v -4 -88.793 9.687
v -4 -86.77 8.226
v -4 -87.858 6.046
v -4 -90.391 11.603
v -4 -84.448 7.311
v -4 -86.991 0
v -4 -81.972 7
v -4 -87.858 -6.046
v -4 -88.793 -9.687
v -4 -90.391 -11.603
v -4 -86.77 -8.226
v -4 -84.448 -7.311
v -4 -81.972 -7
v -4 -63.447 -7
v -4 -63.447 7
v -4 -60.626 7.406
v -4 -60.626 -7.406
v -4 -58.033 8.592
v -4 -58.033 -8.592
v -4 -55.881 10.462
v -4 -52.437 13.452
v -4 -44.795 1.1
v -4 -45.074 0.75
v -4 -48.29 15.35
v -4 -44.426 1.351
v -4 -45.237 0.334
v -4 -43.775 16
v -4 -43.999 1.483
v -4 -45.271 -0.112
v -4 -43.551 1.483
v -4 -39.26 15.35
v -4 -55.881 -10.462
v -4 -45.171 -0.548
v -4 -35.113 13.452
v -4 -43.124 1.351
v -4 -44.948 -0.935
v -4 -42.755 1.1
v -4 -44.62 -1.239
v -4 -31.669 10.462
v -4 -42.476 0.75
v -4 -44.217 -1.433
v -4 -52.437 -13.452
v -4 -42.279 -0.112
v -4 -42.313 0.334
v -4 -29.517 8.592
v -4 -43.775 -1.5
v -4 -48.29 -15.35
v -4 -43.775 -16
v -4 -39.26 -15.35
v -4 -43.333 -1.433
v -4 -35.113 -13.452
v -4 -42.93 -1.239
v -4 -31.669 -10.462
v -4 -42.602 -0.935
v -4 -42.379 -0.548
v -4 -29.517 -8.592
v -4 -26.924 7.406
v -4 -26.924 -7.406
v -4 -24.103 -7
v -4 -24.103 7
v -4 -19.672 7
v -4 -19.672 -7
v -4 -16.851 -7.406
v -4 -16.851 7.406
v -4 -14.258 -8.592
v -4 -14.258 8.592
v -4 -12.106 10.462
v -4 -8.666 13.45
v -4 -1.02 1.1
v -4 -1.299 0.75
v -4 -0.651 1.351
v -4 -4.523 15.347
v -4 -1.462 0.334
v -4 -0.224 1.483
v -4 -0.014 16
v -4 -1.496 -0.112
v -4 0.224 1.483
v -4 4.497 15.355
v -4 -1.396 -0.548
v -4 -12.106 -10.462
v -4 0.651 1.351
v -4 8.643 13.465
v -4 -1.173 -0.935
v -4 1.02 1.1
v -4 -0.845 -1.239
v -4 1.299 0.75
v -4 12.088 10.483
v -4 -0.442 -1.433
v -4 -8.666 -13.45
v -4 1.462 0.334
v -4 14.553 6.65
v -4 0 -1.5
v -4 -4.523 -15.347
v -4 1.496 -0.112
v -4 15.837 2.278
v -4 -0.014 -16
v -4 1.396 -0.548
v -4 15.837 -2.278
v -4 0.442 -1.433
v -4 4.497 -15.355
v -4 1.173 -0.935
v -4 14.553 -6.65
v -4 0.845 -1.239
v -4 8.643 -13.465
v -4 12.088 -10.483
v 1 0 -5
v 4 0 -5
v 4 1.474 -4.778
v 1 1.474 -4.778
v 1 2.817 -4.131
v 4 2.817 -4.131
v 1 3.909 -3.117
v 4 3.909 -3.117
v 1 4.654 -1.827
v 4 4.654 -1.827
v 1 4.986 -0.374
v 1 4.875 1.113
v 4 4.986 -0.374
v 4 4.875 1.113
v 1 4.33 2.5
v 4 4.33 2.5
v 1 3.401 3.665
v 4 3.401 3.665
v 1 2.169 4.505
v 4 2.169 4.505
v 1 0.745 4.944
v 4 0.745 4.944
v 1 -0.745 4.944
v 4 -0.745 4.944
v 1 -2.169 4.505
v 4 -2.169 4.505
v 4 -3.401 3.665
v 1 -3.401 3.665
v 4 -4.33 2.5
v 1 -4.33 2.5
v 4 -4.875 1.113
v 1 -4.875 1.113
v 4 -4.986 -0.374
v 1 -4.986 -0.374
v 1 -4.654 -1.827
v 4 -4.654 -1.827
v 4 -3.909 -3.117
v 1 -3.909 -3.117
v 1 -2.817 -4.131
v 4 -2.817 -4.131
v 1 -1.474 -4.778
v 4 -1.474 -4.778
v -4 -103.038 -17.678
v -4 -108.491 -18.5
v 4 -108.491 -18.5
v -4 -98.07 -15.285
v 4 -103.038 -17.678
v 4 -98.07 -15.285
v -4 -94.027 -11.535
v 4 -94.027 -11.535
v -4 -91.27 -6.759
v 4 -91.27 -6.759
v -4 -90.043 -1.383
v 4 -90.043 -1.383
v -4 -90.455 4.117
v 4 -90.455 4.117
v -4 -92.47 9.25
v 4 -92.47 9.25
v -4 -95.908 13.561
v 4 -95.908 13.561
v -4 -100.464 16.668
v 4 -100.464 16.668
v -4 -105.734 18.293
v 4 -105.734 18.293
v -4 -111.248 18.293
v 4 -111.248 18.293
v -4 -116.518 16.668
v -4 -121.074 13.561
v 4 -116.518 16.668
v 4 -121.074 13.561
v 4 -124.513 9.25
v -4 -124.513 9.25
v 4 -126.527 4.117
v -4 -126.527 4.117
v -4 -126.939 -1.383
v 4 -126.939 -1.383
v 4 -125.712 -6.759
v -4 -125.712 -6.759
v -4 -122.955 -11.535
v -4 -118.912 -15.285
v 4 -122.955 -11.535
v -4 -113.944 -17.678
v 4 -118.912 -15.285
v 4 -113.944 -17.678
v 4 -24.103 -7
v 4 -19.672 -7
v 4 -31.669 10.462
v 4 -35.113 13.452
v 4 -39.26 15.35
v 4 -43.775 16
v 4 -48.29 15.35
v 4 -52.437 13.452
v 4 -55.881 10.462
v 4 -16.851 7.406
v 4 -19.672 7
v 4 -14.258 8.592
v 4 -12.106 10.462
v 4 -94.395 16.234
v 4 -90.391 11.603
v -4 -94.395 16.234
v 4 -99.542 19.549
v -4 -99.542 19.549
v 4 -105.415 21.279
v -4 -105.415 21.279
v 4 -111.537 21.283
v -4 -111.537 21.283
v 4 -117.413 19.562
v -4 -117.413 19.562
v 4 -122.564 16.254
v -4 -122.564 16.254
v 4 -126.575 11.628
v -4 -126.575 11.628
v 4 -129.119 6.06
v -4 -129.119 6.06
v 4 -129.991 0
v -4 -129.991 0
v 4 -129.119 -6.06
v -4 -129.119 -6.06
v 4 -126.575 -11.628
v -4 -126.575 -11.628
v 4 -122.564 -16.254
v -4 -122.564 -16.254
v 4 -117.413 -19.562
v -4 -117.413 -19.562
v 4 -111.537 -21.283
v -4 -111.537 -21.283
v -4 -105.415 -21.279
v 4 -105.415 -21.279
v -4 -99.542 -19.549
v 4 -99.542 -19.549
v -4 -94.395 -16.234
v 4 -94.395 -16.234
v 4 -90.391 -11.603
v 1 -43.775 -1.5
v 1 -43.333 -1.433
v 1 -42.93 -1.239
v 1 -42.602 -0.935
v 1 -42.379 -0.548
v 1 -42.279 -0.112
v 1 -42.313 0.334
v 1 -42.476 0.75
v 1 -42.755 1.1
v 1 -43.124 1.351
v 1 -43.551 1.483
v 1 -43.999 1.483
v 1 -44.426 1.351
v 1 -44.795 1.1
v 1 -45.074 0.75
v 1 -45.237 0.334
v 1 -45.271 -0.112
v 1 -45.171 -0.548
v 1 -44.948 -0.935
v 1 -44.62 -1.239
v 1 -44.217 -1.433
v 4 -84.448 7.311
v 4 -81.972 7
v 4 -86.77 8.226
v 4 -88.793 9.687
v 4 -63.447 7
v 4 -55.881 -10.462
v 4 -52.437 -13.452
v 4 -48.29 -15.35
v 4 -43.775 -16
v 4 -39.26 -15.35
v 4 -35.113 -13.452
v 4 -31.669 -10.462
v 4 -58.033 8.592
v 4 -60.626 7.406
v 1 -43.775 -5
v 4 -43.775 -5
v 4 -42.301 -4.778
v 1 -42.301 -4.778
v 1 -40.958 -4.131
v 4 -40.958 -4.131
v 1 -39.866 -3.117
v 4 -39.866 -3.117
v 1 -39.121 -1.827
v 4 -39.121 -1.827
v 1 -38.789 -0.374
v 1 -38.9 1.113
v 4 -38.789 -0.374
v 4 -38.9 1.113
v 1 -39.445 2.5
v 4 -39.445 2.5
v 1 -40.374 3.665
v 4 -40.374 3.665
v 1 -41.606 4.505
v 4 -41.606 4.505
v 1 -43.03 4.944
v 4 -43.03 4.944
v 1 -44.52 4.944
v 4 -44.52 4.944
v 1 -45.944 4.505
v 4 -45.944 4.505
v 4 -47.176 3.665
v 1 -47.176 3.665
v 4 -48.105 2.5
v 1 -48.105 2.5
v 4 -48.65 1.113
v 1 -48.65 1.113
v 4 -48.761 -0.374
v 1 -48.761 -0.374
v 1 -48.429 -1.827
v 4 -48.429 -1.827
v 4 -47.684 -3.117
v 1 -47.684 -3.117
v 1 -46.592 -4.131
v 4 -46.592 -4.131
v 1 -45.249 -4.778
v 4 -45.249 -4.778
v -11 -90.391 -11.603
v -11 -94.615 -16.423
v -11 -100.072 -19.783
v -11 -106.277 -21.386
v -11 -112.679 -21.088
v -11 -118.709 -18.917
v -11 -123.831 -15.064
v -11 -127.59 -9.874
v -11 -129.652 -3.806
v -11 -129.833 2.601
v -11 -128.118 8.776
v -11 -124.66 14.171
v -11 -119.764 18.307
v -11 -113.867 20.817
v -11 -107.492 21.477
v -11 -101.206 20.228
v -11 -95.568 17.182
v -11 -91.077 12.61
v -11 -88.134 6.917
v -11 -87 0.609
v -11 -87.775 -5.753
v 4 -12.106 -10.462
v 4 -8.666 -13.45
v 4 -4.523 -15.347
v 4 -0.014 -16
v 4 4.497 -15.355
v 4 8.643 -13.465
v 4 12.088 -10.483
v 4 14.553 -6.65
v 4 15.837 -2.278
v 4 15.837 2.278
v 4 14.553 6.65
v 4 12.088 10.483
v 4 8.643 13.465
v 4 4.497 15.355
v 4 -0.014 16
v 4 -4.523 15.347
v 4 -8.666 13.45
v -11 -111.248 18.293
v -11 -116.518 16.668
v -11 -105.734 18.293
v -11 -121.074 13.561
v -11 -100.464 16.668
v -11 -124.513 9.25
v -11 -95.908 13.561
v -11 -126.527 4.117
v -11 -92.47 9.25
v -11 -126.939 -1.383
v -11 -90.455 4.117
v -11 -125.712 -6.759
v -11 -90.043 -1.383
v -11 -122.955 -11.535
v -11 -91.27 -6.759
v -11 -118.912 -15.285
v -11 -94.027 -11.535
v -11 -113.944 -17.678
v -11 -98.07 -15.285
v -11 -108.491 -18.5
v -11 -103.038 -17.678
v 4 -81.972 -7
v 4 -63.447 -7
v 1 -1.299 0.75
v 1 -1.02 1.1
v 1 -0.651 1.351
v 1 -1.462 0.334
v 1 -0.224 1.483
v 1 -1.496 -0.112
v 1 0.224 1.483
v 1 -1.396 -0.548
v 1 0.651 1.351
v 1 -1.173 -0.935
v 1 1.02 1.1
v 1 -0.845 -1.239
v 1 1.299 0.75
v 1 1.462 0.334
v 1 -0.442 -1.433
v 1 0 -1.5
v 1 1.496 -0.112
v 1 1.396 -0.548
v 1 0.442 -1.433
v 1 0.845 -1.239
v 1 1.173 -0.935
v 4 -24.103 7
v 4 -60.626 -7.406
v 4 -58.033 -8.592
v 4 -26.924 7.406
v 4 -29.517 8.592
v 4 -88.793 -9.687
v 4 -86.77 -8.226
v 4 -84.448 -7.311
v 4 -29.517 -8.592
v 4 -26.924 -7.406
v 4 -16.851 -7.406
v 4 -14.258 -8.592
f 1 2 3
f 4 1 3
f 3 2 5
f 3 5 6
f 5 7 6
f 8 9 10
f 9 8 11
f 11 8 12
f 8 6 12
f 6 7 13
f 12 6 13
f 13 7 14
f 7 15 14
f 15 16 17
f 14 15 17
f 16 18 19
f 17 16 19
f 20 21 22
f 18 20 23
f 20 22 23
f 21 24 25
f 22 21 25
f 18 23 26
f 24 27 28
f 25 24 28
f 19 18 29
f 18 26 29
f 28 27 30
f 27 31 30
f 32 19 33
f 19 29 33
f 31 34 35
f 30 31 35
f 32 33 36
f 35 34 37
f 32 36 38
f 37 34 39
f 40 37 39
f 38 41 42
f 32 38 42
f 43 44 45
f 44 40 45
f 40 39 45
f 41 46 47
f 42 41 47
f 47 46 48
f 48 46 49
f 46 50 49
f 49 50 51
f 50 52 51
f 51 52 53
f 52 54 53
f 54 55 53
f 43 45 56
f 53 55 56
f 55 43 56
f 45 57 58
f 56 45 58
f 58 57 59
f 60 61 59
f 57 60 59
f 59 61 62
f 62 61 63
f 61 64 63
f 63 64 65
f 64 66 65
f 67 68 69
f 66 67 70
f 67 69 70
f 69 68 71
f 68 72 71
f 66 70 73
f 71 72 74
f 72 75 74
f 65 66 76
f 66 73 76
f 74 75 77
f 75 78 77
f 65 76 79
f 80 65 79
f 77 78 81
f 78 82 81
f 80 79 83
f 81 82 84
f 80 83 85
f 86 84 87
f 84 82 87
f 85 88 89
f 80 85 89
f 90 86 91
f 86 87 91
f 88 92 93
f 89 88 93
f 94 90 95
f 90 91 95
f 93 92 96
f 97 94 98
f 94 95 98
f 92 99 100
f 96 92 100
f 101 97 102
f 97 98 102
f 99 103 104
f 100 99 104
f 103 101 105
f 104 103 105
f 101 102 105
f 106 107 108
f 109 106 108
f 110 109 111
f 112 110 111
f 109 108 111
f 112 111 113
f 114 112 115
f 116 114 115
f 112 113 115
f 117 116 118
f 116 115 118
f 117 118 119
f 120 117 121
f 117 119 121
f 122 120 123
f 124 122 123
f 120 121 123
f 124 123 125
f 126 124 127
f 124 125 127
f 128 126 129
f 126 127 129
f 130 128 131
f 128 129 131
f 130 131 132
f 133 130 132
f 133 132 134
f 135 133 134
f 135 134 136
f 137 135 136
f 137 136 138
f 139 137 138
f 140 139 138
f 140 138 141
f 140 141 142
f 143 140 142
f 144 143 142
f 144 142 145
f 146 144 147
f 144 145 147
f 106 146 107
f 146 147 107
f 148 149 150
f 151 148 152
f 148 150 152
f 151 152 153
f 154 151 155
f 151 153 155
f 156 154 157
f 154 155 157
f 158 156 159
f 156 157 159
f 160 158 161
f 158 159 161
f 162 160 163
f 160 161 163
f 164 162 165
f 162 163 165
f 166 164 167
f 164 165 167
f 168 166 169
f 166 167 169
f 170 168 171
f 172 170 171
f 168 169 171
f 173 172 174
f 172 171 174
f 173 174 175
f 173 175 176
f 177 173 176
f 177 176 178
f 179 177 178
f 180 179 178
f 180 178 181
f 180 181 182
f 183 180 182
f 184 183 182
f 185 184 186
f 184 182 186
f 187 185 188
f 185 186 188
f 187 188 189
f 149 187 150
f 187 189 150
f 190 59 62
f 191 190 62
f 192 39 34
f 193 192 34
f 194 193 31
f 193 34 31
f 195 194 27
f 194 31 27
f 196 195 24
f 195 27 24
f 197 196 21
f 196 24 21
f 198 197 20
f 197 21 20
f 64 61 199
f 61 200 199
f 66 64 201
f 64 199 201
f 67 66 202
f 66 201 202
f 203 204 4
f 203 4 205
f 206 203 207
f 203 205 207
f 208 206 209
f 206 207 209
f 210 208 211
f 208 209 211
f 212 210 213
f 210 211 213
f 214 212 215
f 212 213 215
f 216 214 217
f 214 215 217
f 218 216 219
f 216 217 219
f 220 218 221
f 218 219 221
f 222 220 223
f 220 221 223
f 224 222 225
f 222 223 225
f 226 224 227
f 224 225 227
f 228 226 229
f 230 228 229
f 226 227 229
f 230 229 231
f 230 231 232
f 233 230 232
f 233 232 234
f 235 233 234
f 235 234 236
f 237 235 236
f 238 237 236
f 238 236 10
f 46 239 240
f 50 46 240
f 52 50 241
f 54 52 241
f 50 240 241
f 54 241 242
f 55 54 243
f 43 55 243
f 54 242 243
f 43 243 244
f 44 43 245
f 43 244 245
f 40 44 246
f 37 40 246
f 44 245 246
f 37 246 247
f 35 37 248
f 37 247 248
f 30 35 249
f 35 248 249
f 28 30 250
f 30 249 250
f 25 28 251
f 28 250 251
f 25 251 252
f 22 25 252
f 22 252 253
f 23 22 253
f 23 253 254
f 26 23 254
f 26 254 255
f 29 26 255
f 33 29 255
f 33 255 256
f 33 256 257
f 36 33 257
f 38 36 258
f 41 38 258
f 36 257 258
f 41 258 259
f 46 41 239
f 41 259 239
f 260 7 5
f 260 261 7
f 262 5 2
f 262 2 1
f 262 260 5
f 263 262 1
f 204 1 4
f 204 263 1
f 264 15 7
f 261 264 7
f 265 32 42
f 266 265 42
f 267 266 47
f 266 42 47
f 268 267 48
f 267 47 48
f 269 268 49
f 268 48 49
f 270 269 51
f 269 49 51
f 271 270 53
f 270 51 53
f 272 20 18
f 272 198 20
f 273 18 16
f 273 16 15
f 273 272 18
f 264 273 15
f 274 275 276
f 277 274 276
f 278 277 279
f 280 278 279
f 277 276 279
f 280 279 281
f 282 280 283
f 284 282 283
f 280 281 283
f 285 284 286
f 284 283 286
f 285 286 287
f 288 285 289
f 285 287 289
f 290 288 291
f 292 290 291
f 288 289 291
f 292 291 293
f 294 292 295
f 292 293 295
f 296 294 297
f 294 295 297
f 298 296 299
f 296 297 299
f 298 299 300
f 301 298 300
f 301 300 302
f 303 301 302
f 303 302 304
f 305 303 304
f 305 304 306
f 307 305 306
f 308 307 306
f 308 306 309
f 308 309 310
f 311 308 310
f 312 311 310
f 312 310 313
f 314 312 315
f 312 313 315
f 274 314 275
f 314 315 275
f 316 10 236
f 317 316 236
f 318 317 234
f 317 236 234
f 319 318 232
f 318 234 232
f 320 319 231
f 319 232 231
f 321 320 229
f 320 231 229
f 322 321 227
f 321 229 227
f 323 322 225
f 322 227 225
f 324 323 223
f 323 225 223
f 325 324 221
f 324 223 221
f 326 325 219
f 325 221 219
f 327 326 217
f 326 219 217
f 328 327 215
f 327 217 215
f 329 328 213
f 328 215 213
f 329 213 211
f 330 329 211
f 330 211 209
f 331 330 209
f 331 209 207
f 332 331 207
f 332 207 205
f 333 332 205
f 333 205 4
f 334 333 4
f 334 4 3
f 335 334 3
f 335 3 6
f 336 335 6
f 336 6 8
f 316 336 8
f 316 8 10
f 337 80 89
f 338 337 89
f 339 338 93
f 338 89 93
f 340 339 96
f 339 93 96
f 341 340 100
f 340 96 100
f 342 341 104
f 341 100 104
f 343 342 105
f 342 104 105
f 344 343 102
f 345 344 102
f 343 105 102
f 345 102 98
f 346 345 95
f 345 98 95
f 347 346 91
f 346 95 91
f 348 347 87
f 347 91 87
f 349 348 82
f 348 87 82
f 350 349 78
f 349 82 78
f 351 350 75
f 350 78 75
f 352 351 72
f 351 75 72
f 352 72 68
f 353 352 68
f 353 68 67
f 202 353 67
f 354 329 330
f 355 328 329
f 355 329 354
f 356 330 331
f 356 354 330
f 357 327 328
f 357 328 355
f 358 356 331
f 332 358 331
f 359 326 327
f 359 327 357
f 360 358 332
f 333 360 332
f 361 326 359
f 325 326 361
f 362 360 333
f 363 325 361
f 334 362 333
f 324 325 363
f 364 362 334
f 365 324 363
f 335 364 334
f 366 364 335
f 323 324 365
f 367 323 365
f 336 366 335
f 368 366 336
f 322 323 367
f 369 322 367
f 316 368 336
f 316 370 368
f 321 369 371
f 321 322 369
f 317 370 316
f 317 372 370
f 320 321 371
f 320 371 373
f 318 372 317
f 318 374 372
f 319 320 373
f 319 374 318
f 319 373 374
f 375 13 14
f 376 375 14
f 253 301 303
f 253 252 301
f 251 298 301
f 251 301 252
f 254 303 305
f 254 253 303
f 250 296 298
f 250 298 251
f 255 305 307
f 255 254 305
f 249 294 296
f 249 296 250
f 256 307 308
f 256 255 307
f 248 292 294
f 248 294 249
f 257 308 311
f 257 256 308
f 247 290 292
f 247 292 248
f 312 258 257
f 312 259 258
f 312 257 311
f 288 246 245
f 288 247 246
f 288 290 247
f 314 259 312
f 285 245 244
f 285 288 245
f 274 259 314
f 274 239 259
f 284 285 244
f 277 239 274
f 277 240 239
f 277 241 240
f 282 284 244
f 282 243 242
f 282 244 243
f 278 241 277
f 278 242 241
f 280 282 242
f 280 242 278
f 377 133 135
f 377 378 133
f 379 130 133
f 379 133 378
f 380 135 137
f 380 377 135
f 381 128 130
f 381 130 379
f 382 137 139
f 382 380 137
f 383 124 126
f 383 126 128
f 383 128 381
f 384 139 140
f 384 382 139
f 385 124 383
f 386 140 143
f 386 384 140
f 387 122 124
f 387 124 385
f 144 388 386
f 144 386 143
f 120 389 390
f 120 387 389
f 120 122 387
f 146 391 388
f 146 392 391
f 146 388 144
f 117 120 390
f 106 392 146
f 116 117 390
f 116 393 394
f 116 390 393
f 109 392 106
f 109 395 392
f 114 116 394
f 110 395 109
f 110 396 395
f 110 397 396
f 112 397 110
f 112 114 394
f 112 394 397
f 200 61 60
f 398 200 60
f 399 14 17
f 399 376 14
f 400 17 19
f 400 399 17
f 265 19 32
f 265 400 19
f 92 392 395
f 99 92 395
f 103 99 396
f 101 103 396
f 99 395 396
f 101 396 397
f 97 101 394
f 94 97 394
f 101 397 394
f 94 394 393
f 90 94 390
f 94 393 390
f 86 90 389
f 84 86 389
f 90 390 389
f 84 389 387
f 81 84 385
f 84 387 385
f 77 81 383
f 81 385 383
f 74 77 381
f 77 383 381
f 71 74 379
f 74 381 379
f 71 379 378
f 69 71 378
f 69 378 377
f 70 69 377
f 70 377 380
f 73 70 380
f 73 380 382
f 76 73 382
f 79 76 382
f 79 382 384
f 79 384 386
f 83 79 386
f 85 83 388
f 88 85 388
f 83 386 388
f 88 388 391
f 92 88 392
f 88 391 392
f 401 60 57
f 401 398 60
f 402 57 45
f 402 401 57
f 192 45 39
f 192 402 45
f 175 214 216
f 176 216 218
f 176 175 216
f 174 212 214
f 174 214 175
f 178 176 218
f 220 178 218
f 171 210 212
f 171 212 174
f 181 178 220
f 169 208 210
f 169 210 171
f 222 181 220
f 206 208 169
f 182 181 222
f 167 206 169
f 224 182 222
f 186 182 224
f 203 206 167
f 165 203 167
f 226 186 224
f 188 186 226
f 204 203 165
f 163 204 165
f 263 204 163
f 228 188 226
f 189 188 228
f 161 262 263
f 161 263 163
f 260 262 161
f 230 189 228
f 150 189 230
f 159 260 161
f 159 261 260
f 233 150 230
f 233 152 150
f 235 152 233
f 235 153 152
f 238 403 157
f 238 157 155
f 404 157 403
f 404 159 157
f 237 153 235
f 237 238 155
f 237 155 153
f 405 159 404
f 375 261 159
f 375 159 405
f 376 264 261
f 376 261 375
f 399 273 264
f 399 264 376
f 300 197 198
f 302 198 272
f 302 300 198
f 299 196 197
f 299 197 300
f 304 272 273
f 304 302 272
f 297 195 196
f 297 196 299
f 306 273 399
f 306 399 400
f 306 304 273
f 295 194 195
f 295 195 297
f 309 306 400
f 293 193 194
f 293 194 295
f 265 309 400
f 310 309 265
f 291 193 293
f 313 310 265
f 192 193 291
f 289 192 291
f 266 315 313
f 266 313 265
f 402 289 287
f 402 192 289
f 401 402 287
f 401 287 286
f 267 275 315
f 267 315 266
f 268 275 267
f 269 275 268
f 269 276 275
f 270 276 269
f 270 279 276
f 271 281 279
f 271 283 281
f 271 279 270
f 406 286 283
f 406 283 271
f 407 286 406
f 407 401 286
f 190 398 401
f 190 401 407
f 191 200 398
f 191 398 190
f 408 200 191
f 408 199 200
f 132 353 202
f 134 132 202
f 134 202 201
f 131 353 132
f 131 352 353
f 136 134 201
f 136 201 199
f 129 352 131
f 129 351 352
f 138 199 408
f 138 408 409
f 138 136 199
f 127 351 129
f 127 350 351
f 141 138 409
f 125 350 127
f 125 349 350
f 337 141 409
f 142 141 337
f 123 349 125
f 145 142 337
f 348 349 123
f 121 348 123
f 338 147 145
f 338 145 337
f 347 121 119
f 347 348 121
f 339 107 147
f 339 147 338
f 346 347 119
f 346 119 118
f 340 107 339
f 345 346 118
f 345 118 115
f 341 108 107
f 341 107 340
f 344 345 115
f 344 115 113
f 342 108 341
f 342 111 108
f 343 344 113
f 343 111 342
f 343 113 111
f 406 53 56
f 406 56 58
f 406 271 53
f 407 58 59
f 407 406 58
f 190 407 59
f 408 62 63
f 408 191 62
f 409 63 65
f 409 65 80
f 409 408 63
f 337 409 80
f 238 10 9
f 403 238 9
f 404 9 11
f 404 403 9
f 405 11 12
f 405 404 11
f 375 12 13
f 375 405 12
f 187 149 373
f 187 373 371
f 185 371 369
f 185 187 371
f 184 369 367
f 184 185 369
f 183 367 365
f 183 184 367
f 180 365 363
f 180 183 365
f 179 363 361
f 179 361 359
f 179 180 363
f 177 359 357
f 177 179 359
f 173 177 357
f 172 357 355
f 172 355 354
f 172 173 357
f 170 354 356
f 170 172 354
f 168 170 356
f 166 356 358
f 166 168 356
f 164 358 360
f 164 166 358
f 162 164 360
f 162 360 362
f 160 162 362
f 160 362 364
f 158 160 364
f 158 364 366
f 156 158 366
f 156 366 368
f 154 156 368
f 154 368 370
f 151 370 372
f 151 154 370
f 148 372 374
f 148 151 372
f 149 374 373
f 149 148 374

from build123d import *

# Parameters (mm, degrees)
BOSS_EXTRUDE1_DEPTH      = 4
BOSS_EXTRUDE1_DEPTH_BACK = 4
FILLET1_R                = 10
SKETCH2_R                = 5
CUT_EXTRUDE1_DEPTH       = 3
SKETCH3_R                = 1.5
CUT_EXTRUDE2_DEPTH       = 5
SKETCH4_R                = 18.5
CUT_EXTRUDE3_DEPTH       = 8
SKETCH5_R                = 21.5
SKETCH5_R_2              = 18.5
BOSS_EXTRUDE2_DEPTH      = 7


with BuildPart() as part:
    # Sketch1 → Boss-Extrude1 (new, two sides: drawn at the far end of the back side and taken through both)
    with BuildSketch(Plane(origin=(0, 0, 0), x_dir=(0, 0, -1), z_dir=(1, 0, 0)).offset(-BOSS_EXTRUDE1_DEPTH_BACK)):
        with BuildLine():
            Line((-7, -14.38749457), (-7, -29.38749457))
            ThreePointArc((-7, -29.38749457), (-16, -43.77498914), (-7, -58.16248371))
            Line((-7, -58.16248371), (-7, -88.16248371))
            ThreePointArc((-7, -88.16248371), (0, -129.99103506), (7, -88.16248371))
            Line((7, -88.16248371), (7, -58.16248371))
            ThreePointArc((7, -58.16248371), (16, -43.77498914), (7, -29.38749457))
            Line((7, -29.38749457), (7, -14.38749457))
            ThreePointArc((7, -14.38749457), (0, 16), (-7, -14.38749457))
        make_face()
    extrude(amount=BOSS_EXTRUDE1_DEPTH + BOSS_EXTRUDE1_DEPTH_BACK)

    # Fillet1
    fillet1_edges = [part.edges().sort_by_distance(p)[0] for p in [
        (0, -29.38749457, 7),
        (0, -14.38749457, 7),
        (0, -14.38749457, -7),
        (0, -29.38749457, -7),
        (0, -58.16248371, -7),
        (0, -88.16248371, -7),
        (0, -88.16248371, 7),
        (0, -58.16248371, 7),
    ]]
    fillet(fillet1_edges, radius=FILLET1_R)

    # Sketch2 → Cut-Extrude1 (cut)
    with BuildSketch(Plane(origin=(4, 0, 0), x_dir=(0, 0, -1), z_dir=(1, 0, 0))):
        Circle(SKETCH2_R)
        with Locations((0, -43.77498914)):
            Circle(SKETCH2_R)
    extrude(amount=-CUT_EXTRUDE1_DEPTH, mode=Mode.SUBTRACT)

    # Sketch3 → Cut-Extrude2 (cut)
    with BuildSketch(Plane(origin=(1, 0, 0), x_dir=(0, 0, -1), z_dir=(1, 0, 0))):
        Circle(SKETCH3_R)
        with Locations((0, -43.77498914)):
            Circle(SKETCH3_R)
    extrude(amount=-CUT_EXTRUDE2_DEPTH, mode=Mode.SUBTRACT)

    # Sketch4 → Cut-Extrude3 (cut)
    with BuildSketch(Plane(origin=(4, 0, 0), x_dir=(0, 0, -1), z_dir=(1, 0, 0))):
        with Locations((0, -108.49103506)):
            Circle(SKETCH4_R)
    extrude(amount=-CUT_EXTRUDE3_DEPTH, mode=Mode.SUBTRACT)

    # Sketch5 → Boss-Extrude2 (add)
    with BuildSketch(Plane.ZY.offset(4)):
        with Locations(Location((0, -108.49103506, 0), (0, 0, 122.662030563))):
            Circle(SKETCH5_R)
        with Locations(Location((0, -108.49103506, 0), (0, 0, 180))):
            Circle(SKETCH5_R_2, mode=Mode.SUBTRACT)
    extrude(amount=BOSS_EXTRUDE2_DEPTH)


solid = part.part
